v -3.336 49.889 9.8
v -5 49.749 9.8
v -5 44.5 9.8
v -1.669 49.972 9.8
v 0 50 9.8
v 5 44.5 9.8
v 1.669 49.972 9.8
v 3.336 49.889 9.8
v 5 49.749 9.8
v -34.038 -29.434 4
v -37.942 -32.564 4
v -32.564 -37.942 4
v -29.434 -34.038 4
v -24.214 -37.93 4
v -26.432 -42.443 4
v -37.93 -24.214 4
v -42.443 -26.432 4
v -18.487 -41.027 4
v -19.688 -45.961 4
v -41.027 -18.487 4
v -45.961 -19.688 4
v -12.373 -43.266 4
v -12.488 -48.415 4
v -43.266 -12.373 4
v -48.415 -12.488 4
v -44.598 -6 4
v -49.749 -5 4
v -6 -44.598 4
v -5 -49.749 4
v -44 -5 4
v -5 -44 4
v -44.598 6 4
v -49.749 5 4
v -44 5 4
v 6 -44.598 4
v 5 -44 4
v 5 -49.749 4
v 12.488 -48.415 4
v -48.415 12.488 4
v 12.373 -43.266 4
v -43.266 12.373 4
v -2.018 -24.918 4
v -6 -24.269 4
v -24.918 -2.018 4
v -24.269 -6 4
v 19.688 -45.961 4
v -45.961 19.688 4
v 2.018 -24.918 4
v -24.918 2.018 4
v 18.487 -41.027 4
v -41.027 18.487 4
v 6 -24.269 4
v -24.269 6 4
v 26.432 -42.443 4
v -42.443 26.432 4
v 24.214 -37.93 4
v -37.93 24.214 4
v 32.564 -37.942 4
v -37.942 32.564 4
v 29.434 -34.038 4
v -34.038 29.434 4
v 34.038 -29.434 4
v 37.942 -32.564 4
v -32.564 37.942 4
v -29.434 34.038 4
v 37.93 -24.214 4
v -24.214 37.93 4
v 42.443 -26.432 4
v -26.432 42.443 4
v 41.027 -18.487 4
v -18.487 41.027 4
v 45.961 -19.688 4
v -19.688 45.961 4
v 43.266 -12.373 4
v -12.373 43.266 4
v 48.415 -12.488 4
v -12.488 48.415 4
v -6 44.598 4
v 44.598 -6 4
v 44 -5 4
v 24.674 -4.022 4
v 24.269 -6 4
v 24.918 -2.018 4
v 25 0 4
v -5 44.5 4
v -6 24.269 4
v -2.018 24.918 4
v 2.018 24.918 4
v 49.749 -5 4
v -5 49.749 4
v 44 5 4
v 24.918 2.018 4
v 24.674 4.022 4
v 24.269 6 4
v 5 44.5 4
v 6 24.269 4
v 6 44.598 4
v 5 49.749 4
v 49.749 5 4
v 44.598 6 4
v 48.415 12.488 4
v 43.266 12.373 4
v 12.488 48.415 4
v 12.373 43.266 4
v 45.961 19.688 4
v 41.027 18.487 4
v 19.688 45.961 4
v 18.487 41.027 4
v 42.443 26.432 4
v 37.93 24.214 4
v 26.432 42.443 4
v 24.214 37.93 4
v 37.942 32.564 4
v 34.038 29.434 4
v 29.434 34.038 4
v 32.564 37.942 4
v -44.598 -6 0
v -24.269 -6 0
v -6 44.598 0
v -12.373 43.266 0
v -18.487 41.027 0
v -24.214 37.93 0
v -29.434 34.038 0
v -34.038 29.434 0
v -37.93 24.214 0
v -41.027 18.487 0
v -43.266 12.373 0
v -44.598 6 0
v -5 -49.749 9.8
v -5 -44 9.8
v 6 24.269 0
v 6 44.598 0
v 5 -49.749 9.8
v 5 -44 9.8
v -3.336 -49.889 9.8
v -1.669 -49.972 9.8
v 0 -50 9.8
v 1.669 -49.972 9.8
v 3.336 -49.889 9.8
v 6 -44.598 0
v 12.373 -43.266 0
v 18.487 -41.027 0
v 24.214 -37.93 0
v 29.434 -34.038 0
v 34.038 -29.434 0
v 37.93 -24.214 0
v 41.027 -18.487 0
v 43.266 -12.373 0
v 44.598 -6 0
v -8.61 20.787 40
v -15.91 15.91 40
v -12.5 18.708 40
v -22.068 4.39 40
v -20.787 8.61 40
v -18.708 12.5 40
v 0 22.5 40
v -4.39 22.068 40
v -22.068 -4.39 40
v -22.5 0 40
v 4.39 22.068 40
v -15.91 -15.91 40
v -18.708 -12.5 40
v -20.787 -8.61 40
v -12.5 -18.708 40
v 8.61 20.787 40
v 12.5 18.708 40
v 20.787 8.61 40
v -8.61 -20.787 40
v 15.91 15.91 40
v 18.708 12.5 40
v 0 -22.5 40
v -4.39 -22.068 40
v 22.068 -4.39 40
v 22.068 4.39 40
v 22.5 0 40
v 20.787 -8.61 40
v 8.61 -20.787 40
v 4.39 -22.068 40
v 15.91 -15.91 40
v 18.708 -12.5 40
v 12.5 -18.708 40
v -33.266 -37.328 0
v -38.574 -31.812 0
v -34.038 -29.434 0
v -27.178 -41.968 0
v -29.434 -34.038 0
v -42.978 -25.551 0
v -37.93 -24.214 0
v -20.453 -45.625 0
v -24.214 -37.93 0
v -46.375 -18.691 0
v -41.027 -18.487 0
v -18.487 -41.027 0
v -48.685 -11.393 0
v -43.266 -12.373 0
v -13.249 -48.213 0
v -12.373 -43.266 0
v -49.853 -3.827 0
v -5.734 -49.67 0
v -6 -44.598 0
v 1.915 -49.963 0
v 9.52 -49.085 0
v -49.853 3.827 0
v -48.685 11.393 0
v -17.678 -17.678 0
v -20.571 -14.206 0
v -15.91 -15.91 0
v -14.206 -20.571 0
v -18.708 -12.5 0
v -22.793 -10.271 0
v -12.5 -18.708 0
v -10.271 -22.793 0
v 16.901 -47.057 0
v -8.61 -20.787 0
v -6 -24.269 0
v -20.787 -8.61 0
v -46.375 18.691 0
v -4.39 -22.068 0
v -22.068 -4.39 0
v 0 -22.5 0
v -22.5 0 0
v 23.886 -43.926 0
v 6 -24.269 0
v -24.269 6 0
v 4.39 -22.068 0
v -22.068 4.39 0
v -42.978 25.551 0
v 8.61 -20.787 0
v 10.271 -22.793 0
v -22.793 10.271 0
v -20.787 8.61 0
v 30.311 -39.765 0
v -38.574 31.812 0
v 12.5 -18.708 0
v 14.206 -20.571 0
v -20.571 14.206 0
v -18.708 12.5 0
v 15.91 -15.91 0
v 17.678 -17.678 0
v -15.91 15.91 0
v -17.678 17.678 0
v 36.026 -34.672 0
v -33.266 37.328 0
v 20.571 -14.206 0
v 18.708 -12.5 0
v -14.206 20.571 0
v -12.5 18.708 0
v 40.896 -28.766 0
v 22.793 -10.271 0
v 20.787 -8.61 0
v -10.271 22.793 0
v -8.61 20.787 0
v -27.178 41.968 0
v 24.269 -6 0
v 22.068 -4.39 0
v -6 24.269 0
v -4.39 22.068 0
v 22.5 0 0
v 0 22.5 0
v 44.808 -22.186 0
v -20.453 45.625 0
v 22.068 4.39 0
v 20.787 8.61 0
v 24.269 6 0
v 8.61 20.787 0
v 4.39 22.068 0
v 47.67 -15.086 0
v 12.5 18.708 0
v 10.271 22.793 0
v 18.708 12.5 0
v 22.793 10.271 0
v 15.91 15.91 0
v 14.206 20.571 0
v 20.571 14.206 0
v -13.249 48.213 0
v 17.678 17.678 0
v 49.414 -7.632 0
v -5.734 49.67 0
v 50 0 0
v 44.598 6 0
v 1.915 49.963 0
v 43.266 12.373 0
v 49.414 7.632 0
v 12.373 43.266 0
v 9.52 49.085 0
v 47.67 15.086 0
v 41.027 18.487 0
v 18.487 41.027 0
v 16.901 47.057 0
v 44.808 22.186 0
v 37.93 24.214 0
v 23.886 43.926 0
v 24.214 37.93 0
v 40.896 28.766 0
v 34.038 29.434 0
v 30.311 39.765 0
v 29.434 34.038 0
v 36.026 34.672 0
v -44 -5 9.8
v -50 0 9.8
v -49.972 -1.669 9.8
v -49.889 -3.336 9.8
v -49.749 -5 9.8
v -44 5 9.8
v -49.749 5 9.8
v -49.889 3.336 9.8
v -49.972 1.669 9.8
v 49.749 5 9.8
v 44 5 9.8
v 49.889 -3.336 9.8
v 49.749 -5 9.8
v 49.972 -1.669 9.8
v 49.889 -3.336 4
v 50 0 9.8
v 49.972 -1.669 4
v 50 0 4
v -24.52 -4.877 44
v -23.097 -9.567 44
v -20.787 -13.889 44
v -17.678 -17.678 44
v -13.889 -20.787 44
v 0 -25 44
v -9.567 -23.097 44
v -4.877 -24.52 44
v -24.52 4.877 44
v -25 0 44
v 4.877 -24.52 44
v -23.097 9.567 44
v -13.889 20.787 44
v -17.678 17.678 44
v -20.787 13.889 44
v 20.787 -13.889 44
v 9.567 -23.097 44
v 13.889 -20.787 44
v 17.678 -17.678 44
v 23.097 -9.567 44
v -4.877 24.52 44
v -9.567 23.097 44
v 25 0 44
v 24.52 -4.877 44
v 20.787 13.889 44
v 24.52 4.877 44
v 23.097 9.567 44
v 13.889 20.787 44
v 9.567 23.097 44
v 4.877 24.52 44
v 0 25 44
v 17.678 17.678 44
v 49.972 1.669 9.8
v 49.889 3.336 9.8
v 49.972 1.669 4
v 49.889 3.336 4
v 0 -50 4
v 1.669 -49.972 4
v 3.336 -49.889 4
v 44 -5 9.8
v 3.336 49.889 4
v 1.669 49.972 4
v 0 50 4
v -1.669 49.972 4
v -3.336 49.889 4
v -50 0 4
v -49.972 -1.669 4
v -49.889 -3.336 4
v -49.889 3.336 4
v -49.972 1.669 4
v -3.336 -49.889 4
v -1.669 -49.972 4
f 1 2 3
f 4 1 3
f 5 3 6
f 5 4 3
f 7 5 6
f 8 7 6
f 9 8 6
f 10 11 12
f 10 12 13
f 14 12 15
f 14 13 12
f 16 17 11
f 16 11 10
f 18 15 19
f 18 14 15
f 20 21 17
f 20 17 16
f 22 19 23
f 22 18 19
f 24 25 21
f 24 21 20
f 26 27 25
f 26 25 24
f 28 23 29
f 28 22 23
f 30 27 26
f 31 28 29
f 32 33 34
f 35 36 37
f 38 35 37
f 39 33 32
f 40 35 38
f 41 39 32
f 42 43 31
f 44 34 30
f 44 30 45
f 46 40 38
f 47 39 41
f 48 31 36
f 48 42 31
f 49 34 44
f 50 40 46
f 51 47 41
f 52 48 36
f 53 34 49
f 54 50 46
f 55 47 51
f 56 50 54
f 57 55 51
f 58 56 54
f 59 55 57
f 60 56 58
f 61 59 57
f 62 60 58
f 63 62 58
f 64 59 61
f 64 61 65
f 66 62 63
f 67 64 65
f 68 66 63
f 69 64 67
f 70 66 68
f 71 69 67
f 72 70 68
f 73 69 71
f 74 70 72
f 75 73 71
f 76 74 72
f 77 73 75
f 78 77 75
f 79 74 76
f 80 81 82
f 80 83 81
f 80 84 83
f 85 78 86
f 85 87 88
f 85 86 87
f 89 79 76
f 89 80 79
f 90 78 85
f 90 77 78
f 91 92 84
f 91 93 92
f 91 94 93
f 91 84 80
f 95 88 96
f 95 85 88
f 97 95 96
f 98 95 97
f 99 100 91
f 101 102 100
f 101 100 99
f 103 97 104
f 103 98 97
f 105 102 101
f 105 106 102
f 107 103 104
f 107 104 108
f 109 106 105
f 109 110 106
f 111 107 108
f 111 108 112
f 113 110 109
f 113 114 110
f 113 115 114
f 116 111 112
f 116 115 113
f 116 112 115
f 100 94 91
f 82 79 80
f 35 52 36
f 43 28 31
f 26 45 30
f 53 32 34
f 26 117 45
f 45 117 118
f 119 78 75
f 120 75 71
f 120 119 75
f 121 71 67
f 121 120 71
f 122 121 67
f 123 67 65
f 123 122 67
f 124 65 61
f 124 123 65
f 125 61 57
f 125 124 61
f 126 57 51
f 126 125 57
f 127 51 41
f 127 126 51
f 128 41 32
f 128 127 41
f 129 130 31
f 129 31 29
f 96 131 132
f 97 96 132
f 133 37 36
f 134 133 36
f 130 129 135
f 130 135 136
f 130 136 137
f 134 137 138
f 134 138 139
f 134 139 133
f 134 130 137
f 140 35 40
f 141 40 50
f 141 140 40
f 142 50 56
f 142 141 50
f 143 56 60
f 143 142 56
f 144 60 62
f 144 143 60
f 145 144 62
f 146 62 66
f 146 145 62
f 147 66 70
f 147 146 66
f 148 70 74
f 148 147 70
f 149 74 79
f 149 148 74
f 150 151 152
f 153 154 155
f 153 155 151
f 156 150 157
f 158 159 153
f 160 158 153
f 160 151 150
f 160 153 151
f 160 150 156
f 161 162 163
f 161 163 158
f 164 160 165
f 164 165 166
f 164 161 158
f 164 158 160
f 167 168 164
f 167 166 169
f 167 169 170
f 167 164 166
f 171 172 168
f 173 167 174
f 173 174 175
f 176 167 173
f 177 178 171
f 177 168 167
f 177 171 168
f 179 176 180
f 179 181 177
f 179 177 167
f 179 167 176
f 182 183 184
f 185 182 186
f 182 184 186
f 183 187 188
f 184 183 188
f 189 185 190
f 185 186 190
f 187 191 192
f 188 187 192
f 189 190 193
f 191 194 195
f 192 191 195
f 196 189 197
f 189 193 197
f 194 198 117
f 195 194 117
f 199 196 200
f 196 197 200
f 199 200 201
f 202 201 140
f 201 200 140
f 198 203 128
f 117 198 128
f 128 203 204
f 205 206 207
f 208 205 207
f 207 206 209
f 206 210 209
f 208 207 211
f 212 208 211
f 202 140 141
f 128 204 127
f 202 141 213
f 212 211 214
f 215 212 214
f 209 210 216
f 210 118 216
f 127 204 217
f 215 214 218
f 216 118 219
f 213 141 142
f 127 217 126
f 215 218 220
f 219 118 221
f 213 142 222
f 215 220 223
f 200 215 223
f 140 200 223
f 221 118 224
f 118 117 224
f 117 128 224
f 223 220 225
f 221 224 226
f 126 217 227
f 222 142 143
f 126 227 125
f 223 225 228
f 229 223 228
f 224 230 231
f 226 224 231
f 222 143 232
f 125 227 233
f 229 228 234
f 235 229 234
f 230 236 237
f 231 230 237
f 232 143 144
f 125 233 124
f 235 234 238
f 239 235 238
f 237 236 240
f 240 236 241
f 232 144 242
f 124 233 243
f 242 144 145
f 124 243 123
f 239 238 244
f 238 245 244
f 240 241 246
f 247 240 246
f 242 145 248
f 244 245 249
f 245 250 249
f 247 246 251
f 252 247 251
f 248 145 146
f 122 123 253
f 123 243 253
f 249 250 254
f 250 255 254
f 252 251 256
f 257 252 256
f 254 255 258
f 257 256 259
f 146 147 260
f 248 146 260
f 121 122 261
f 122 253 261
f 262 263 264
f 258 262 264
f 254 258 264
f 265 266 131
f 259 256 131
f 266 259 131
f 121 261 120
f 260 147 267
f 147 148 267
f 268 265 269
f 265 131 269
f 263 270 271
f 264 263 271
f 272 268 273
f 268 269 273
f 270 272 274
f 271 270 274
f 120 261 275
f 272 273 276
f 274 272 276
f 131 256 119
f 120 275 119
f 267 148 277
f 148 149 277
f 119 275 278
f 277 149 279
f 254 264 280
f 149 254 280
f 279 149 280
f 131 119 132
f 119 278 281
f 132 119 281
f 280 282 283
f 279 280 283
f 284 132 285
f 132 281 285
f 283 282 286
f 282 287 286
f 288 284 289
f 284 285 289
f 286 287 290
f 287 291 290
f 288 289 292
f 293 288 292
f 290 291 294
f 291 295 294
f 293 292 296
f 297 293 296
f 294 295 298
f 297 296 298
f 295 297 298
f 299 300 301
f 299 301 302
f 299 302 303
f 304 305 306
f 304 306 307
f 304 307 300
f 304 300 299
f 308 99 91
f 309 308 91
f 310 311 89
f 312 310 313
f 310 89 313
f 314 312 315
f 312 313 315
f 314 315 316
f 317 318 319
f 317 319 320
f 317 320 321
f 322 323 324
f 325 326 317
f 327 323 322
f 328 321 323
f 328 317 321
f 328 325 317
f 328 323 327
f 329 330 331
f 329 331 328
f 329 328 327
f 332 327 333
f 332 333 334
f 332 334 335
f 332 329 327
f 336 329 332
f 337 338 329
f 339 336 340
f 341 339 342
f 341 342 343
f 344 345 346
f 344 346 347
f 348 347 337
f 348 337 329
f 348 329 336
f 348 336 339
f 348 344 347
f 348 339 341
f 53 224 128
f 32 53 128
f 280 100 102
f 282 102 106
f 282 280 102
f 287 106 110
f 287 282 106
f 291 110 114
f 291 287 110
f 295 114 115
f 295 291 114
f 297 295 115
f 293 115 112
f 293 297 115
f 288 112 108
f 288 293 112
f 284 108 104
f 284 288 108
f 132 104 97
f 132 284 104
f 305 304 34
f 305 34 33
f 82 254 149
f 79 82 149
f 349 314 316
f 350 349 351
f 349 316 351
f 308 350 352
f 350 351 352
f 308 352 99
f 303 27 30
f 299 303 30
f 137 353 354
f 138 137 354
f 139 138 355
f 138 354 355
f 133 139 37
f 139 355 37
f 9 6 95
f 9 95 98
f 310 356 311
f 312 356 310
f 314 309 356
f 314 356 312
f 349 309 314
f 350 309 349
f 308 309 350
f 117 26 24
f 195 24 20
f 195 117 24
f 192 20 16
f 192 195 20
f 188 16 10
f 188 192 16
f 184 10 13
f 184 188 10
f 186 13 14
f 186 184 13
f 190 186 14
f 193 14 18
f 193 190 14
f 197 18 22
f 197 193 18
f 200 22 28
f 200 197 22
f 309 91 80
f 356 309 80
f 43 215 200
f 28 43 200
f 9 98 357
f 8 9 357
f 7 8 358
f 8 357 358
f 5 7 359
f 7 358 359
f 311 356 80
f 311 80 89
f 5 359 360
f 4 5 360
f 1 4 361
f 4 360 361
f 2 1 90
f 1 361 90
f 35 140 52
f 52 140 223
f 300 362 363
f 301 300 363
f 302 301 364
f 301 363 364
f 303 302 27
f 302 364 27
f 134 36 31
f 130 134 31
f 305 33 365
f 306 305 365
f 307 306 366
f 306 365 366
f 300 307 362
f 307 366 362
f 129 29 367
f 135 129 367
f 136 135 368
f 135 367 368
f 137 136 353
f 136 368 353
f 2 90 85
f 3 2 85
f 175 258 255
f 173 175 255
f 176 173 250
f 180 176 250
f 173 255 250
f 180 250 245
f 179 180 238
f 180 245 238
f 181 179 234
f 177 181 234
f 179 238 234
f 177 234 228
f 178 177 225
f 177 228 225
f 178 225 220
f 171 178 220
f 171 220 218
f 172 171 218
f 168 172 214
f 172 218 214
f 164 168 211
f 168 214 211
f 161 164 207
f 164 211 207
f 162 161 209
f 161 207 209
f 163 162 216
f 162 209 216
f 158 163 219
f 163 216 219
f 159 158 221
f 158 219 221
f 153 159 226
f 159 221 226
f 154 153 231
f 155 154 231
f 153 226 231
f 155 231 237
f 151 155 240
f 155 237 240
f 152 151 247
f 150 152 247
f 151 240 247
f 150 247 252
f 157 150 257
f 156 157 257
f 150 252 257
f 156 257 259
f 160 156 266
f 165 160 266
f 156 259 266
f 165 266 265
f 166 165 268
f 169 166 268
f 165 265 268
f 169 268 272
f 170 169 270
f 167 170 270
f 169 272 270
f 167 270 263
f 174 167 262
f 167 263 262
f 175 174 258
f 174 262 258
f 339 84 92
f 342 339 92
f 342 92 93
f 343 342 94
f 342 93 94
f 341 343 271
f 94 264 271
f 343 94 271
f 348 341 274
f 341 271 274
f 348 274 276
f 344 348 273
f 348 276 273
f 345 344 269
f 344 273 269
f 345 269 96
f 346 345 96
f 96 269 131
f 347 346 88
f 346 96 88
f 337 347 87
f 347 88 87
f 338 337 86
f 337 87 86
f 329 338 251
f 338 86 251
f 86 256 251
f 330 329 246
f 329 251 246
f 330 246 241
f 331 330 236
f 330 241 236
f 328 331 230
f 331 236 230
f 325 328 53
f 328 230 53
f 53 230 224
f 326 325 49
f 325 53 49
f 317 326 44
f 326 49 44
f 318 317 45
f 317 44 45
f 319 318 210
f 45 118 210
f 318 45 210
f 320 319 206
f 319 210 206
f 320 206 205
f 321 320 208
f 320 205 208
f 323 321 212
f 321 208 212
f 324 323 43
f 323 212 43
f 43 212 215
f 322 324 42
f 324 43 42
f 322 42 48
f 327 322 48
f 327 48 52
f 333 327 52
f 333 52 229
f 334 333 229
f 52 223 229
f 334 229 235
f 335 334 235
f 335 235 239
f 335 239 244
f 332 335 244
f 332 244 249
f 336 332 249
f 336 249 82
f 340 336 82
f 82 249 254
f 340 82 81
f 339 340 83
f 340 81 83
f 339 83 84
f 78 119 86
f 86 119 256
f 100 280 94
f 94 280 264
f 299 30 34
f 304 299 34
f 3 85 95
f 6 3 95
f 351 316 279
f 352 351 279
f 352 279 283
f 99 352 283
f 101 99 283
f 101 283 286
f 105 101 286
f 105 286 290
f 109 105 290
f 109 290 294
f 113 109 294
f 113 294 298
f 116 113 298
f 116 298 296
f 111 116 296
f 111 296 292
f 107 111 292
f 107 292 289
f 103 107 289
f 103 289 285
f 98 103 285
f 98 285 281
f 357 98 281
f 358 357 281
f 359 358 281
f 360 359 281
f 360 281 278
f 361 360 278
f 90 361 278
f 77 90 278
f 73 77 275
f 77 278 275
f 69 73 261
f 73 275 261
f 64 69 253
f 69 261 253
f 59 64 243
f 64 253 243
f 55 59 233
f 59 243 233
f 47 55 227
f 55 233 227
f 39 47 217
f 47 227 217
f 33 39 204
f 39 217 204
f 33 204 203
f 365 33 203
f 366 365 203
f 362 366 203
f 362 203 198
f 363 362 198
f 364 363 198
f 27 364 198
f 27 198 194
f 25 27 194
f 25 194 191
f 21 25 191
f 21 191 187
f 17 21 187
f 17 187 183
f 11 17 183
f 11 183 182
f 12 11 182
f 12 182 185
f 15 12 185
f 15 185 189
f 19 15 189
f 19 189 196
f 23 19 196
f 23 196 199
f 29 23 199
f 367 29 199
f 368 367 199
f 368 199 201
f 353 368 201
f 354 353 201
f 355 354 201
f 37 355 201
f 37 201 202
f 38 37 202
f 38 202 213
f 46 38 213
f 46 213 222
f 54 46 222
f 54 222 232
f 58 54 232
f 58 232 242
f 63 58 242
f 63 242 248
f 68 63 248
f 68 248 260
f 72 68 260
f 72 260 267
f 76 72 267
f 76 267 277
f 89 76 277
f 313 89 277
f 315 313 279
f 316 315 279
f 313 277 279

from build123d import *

# Parameters (mm, degrees)
F0_R      = 50
F1_DEPTH  = 4
F2_R      = 25
F3_DEPTH  = 40
F5_DEPTH  = 5.8
F6_DEPTH  = 5.8
F7_DEPTH  = 5.8
F8_R      = 45
F9_DEPTH  = 4
F10_W     = 6
F10_H     = 6
F11_DEPTH = 4
F12_R     = 25
F13_DEPTH = 5
F14_R     = 22.5
F15_DEPTH = 40


with BuildPart() as f1:
    # F0 (on Top) → F1 (new body)
    with BuildSketch(Plane.XY):
        Circle(F0_R)
    extrude(amount=F1_DEPTH)

    # F2 (on face) → F3 (join)
    with BuildSketch(Plane.XY.offset(4)):
        Circle(F2_R)
    extrude(amount=F3_DEPTH)

    # F4 (on face) → F5 (join)
    with BuildSketch(Plane.XY.offset(4)):
        with BuildLine():
            ThreePointArc((5, 49.7493718553), (2.503138753, 49.9373036555), (0, 50))
            ThreePointArc((0, 50), (-2.503138753, 49.9373036555), (-5, 49.7493718553))
            Line((-5, 49.7493718553), (-5, 44.5003296036))
            Line((-5, 44.5003296036), (5, 44.5003296036))
            Line((5, 44.5003296036), (5, 49.7493718553))
        make_face()
    extrude(amount=F5_DEPTH)

    # F4 (on face) → F6 (join)
    with BuildSketch(Plane.XY.offset(4)):
        with BuildLine():
            ThreePointArc((0, -50), (2.503138753, -49.9373036555), (5, -49.7493718553))
            Line((5, -49.7493718553), (5, -44))
            Line((5, -44), (-5, -44))
            Line((-5, -44), (-5, -49.7493718553))
            ThreePointArc((-5, -49.7493718553), (-2.503138753, -49.9373036555), (0, -50))
        make_face()
    extrude(amount=F6_DEPTH)

    # F4 (on face) → F7 (join)
    with BuildSketch(Plane.XY.offset(4)):
        with BuildLine():
            Line((-44, 5), (-49.7493718553, 5))
            ThreePointArc((-49.7493718553, 5), (-49.9373036555, 2.503138753), (-50, 0))
            ThreePointArc((-50, 0), (-49.9373036555, -2.503138753), (-49.7493718553, -5))
            Line((-49.7493718553, -5), (-44, -5))
            Line((-44, -5), (-44, 5))
        make_face()
        with BuildLine():
            ThreePointArc((50, 0), (49.9373036555, 2.503138753), (49.7493718553, 5))
            Line((49.7493718553, 5), (44, 5))
            Line((44, 5), (44, -5))
            Line((44, -5), (49.7493718553, -5))
            ThreePointArc((49.7493718553, -5), (49.9373036555, -2.503138753), (50, 0))
        make_face()
    extrude(amount=F7_DEPTH)

    # F8 (on Top) → F9 (cut)
    with BuildSketch(Plane.XY):
        Circle(F8_R)
    extrude(amount=F9_DEPTH, mode=Mode.SUBTRACT)

    # F10 (on Top) → F11 (join)
    with BuildSketch(Plane.XY):
        Polygon((6, 46.8811020255), (-6, 46.8811020255), (-6, 6), (0, 6), (6, 6), align=None)
        with Locations((-3, 3)):
            Rectangle(F10_W, F10_H)
        Polygon((-6, 0), (-6, 6), (-46.5700030327, 6), (-46.5700030327, -6), (-6, -6), align=None)
        Polygon((46.8255914748, 6), (6, 6), (6, 0), (6, -6), (46.8255914748, -6), align=None)
        with Locations((3, 3)):
            Rectangle(F10_W, F10_H)
        with Locations((-3, -3)):
            Rectangle(F10_W, F10_H)
        with Locations((3, -3)):
            Rectangle(F10_W, F10_H)
        Polygon((0, -6), (-6, -6), (-6, -46.7753745615), (6, -46.7753745615), (6, -6), align=None)
    extrude(amount=F11_DEPTH)

    # F12 (on Top) → F13 (join)
    with BuildSketch(Plane.XY):
        Circle(F12_R)
    extrude(amount=F13_DEPTH)

    # F14 (on face) → F15 (cut)
    with BuildSketch(Plane(origin=(0, 0, 0), x_dir=(1, 0, 0), z_dir=(0, 0, -1))):
        Circle(F14_R)
    extrude(amount=-F15_DEPTH, mode=Mode.SUBTRACT)


solid = f1.part
